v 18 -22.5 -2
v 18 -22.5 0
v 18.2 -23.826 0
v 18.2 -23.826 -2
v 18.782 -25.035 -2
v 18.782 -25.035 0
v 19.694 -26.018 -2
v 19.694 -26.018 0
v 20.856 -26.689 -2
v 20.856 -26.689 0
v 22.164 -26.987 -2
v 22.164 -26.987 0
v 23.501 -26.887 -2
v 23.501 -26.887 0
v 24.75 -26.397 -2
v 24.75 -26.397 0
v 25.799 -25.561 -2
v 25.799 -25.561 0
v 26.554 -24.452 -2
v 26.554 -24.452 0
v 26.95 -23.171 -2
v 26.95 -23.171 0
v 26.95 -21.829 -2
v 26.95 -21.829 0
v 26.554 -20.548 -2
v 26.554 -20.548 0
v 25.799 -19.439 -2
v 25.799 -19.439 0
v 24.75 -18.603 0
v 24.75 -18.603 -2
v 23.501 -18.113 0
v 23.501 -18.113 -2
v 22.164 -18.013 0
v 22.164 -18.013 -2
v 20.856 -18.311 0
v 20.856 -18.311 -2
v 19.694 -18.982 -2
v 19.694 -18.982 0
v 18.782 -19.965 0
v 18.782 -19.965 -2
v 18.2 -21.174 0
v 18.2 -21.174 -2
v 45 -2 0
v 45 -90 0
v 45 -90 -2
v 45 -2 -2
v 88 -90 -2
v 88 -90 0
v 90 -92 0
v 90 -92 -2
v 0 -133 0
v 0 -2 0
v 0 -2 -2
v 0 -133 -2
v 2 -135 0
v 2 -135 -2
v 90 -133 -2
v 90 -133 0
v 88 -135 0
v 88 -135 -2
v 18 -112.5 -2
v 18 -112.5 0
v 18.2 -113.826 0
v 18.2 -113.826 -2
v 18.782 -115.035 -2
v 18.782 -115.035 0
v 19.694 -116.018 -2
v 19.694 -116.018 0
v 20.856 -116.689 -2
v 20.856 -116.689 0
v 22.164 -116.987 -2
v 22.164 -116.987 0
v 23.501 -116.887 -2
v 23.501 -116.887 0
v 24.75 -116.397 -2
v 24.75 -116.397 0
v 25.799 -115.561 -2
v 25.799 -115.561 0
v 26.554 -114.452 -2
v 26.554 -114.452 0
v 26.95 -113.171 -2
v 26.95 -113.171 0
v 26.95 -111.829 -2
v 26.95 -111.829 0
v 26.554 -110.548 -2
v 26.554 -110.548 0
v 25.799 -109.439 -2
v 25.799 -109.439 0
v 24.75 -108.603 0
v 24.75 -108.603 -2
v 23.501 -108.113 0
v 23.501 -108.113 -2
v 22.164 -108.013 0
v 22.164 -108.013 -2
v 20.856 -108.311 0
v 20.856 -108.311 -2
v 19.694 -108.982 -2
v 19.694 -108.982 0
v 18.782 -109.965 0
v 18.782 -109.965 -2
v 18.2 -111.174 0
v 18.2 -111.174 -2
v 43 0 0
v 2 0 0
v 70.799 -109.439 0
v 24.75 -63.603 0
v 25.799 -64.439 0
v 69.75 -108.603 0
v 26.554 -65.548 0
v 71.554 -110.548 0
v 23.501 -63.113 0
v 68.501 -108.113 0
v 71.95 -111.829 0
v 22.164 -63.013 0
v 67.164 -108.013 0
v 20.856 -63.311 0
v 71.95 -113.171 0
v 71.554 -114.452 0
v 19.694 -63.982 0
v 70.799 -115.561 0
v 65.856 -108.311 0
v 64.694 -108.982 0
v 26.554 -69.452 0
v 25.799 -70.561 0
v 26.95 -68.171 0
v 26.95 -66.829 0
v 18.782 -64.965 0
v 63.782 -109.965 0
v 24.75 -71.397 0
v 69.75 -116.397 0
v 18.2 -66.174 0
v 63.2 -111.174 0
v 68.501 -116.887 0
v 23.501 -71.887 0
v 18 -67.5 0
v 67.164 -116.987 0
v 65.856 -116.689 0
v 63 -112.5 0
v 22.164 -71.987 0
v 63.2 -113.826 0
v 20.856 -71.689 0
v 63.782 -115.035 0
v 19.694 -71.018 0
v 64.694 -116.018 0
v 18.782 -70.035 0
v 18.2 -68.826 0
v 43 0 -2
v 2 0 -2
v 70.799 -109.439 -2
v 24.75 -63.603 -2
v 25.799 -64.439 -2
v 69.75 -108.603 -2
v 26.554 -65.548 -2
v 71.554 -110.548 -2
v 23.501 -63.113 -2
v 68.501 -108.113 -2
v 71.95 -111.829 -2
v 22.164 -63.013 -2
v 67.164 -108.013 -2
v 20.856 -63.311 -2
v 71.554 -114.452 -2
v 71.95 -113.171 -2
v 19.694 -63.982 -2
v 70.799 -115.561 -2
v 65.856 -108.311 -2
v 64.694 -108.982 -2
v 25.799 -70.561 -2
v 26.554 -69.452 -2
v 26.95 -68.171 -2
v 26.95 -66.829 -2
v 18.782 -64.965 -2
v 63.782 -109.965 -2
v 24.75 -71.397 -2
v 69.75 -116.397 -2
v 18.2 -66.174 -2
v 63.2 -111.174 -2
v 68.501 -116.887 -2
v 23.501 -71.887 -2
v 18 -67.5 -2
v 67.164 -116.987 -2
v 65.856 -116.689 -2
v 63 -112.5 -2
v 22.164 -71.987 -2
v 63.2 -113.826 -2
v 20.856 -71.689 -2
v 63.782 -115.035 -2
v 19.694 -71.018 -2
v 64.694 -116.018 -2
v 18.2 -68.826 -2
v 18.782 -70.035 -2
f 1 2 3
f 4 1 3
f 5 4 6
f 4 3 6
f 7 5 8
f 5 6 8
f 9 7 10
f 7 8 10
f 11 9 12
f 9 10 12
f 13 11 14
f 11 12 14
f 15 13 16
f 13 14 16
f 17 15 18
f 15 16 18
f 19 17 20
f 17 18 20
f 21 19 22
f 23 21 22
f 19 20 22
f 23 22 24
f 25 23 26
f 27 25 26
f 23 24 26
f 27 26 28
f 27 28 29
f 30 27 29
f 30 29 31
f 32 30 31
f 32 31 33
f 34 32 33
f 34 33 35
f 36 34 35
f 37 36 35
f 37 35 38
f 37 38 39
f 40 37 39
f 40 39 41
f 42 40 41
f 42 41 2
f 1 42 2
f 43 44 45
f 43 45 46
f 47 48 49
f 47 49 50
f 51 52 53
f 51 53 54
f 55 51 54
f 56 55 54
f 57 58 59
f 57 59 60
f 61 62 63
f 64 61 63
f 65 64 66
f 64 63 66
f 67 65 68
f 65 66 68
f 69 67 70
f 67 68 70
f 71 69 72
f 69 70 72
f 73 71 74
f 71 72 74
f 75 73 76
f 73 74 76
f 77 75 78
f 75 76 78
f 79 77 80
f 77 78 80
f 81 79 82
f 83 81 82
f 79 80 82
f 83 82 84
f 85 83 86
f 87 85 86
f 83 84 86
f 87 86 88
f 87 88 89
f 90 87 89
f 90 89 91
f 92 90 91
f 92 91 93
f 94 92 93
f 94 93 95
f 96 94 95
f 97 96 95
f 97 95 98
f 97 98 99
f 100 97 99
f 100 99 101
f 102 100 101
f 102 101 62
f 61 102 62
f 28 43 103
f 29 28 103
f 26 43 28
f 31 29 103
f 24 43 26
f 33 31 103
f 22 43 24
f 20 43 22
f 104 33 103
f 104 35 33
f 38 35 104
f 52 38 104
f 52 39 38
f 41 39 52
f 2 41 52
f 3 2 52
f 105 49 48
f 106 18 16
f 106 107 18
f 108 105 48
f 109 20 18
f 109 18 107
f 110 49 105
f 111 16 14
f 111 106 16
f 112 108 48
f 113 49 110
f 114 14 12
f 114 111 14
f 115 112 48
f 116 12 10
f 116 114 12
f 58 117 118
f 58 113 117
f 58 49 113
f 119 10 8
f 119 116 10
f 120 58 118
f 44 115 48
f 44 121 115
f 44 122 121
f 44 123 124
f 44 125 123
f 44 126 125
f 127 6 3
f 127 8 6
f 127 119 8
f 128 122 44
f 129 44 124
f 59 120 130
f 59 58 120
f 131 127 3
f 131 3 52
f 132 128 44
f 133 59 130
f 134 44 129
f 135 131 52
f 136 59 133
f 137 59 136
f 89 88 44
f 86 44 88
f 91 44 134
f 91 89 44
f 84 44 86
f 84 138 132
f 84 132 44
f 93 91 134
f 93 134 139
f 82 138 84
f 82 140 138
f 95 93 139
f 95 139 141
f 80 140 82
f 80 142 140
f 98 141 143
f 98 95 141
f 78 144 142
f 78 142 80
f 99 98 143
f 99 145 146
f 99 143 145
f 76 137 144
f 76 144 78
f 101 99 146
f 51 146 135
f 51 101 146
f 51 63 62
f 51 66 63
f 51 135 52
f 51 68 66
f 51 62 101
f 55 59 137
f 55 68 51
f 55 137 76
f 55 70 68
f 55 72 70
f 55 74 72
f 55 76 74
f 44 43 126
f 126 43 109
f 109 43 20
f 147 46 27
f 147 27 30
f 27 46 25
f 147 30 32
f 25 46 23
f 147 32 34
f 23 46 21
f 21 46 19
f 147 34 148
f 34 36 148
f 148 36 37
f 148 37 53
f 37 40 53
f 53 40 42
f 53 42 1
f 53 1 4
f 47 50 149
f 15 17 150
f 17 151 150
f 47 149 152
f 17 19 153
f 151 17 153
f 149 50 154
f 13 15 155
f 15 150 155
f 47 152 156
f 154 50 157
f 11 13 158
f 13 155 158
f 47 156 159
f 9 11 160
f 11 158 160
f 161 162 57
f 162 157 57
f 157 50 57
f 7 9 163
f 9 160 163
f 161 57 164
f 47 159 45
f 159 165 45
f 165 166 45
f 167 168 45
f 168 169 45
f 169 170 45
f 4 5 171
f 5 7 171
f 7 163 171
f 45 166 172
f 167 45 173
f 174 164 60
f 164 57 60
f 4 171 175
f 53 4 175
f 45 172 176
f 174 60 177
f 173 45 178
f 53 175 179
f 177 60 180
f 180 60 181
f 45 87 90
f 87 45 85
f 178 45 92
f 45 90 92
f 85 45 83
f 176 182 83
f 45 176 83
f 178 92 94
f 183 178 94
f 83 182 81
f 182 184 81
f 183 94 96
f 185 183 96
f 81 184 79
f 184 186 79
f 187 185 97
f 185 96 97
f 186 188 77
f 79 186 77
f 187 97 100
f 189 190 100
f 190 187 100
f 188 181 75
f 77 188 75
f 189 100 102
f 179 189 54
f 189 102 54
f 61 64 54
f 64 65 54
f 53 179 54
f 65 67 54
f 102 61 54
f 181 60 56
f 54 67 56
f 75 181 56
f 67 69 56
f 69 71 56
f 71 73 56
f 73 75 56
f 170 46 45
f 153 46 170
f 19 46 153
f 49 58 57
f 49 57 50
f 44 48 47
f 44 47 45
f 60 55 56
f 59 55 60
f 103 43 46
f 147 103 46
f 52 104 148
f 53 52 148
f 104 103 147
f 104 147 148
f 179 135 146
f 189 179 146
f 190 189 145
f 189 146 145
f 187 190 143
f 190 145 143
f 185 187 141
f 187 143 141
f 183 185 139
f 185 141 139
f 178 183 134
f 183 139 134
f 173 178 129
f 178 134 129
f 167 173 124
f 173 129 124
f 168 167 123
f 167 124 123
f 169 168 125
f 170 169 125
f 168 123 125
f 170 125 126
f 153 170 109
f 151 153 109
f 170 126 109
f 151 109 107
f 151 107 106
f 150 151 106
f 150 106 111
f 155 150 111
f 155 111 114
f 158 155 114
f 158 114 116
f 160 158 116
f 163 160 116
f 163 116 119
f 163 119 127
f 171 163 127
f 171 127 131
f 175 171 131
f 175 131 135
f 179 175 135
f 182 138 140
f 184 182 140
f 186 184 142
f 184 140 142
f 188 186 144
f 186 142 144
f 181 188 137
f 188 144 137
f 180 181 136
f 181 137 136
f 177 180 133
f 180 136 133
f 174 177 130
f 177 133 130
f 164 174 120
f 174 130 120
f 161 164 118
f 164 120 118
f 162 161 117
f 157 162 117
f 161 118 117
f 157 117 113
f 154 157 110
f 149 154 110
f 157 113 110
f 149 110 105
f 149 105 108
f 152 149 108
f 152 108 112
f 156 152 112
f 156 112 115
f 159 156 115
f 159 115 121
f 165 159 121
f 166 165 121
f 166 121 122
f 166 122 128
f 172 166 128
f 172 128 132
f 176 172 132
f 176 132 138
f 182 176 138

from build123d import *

# Parameters (mm, degrees)
EXTRUDE_1_DEPTH   = 2
HOLE_WIZARD_M81_D = 9
CHAMFER_1_SIZE    = 2


with BuildPart() as part:
    # Эскиз1 → Бобышка-Вытянуть1 (new body)
    with BuildSketch(Plane(origin=(0, 0, 0), x_dir=(1, 0, 0), z_dir=(0, 0, -1))):
        Polygon((0, 0), (0, 135), (90, 135), (90, 90), (45, 90), (45, 0), align=None)
    extrude(amount=EXTRUDE_1_DEPTH)

    # Отверстие с зазором M81 (through all)
    with Locations(Plane(origin=(0, 0, -2), x_dir=(1, 0, 0), z_dir=(0, 0, -1))):
        with Locations((67.5, 112.5), (22.5, 112.5), (22.5, 67.5), (22.5, 22.5)):
            Hole(HOLE_WIZARD_M81_D / 2)

    # Фаска1
    chamfer_1_edges = [part.edges().sort_by_distance(p)[0] for p in [
        (0, 0, -1),
        (0, -135, -1),
        (90, -135, -1),
        (90, -90, -1),
        (45, 0, -1),
    ]]
    chamfer(chamfer_1_edges, length=CHAMFER_1_SIZE)


solid = part.part
